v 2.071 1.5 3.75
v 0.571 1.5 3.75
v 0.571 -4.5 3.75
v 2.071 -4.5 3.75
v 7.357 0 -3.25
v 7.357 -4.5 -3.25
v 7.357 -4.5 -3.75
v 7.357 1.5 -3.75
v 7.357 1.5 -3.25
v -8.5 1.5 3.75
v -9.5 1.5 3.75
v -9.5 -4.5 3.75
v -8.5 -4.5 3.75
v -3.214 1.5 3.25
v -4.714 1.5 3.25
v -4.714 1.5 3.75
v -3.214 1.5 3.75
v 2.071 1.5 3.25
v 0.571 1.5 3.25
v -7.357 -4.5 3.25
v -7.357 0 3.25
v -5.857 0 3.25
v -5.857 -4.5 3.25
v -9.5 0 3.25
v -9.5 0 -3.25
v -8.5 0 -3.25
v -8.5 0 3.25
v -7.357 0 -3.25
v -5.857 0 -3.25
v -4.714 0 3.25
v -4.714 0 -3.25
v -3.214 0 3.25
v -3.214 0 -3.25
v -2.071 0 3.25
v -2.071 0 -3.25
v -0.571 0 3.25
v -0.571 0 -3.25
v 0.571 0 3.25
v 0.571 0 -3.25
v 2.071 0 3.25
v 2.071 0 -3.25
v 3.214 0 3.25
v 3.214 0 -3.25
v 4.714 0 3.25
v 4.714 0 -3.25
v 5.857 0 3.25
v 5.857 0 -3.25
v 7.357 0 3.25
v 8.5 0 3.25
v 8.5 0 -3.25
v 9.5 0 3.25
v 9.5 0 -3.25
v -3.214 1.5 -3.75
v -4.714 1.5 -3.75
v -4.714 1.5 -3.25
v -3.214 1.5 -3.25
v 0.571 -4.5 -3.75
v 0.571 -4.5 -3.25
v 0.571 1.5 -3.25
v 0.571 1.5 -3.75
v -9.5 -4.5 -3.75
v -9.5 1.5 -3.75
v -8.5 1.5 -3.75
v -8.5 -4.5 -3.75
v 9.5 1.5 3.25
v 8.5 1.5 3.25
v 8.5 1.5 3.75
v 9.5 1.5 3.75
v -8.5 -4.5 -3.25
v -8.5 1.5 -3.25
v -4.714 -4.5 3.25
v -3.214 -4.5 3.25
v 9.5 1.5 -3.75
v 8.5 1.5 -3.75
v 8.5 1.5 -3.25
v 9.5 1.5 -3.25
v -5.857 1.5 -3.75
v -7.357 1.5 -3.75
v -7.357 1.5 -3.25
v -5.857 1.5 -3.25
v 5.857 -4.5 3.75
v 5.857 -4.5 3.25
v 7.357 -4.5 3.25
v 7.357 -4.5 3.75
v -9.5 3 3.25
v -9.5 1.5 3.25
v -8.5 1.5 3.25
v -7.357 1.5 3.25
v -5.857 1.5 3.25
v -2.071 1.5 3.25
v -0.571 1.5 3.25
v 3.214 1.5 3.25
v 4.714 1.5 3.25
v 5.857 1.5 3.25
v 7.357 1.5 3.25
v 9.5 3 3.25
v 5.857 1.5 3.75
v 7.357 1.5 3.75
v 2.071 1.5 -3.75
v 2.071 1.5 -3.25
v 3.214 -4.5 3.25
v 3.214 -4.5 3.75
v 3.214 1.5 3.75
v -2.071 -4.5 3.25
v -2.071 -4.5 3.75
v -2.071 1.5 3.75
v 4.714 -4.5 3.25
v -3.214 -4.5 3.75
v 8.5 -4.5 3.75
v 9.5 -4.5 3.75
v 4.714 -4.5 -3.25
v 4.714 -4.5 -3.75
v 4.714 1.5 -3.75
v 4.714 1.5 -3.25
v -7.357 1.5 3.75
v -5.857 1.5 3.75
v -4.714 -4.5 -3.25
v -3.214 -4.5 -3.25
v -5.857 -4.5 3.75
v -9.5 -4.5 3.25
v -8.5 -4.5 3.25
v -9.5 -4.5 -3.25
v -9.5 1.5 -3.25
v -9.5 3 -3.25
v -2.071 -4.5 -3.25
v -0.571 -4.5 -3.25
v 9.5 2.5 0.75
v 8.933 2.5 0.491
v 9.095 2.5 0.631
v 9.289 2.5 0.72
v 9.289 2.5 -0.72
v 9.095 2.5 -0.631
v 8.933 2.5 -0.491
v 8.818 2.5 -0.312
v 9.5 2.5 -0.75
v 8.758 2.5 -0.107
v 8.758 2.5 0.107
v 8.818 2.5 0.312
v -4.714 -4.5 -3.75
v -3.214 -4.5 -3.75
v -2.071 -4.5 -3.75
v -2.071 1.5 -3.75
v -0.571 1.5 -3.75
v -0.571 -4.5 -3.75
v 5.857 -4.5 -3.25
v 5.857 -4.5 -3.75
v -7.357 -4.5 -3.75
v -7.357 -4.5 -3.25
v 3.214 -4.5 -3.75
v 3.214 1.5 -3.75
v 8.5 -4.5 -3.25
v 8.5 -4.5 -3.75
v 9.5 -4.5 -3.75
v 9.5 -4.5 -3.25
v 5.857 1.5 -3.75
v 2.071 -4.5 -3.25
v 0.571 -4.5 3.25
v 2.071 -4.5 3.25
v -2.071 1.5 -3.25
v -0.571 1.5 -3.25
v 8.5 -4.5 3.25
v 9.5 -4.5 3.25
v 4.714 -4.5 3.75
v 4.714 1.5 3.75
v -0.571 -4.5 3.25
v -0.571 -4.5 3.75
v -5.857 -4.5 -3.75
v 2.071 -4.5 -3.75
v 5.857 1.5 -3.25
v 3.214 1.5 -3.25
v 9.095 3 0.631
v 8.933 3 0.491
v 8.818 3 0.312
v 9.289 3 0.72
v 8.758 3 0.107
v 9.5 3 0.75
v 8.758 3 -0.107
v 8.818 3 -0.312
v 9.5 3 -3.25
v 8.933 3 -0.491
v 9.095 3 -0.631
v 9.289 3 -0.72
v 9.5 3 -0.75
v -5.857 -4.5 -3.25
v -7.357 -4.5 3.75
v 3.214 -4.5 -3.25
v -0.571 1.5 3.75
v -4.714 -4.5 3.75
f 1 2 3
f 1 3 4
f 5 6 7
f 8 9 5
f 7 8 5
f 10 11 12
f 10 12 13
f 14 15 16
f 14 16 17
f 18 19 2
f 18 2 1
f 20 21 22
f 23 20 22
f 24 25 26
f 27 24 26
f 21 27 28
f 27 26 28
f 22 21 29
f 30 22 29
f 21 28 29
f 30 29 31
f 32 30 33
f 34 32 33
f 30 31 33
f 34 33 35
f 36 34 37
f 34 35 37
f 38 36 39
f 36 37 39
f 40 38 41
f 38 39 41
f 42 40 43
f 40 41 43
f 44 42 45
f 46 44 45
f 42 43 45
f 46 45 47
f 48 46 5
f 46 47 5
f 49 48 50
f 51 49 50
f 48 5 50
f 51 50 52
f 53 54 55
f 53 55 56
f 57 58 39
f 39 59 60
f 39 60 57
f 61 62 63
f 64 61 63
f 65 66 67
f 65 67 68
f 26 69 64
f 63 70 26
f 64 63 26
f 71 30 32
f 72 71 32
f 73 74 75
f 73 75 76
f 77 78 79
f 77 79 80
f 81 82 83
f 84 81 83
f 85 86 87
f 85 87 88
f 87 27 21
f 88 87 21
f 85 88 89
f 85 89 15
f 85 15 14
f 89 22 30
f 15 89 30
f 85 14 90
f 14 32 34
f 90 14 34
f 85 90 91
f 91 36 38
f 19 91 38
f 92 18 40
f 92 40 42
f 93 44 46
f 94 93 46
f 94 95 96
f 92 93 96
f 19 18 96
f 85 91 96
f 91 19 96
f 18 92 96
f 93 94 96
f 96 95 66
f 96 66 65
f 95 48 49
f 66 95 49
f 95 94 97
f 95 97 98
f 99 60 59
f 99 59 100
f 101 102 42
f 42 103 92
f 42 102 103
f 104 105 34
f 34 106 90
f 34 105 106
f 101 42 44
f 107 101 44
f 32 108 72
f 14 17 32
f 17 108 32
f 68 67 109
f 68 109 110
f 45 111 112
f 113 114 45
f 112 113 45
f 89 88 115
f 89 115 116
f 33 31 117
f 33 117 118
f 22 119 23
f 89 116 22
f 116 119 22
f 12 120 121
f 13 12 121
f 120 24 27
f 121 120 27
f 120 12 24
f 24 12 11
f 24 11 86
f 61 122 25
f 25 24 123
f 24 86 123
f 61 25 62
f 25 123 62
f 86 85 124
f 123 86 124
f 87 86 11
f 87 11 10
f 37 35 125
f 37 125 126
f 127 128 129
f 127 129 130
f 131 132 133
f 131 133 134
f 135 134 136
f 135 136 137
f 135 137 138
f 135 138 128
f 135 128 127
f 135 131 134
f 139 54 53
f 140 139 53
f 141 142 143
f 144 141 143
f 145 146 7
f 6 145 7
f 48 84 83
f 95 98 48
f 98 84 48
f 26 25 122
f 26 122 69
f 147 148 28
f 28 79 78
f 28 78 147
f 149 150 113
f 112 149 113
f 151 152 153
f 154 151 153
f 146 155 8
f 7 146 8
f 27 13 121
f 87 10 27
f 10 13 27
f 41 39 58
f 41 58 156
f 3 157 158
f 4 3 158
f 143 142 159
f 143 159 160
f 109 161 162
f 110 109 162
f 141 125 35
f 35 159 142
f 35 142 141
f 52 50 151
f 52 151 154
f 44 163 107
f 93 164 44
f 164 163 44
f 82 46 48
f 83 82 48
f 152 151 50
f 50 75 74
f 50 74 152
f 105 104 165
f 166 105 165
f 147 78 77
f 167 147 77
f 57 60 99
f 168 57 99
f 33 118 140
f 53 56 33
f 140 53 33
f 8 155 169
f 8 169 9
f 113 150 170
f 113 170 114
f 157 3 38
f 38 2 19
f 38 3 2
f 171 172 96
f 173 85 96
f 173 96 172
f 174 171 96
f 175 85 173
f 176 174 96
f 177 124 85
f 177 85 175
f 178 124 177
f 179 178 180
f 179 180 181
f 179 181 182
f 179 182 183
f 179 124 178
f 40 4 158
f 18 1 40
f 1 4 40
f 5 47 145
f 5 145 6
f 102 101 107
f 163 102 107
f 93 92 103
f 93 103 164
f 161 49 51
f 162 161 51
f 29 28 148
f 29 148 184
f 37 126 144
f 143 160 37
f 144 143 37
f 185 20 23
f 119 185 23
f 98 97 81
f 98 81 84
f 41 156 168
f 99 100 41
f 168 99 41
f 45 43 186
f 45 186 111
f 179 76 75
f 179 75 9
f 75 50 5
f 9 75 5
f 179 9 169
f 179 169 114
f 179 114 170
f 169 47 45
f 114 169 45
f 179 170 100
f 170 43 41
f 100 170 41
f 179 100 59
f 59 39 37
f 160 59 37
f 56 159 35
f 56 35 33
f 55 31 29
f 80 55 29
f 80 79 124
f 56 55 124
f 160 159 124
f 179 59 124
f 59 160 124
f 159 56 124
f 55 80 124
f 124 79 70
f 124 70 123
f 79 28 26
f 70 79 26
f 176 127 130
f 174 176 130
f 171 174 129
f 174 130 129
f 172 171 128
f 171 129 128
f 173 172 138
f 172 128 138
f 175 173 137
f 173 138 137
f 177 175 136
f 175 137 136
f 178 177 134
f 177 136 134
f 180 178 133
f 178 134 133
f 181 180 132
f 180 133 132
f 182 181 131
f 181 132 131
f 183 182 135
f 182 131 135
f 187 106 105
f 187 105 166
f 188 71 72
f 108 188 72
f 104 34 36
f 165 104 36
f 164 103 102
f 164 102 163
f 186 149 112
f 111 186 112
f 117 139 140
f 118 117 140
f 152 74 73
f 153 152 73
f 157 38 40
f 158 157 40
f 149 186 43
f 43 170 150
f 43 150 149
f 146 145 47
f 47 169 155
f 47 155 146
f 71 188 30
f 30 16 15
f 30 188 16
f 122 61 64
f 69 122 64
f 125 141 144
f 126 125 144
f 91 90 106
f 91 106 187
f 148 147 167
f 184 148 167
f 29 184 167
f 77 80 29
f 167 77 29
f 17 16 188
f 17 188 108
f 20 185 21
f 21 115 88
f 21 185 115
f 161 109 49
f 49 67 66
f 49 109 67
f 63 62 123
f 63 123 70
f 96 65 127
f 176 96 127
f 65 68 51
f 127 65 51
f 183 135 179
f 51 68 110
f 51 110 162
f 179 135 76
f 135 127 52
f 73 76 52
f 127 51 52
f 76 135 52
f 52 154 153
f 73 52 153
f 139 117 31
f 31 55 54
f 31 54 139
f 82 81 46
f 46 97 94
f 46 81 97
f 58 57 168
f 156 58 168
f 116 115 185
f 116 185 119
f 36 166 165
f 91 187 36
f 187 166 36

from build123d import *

# Parameters (mm, degrees)
EXTRUDE_1_DEPTH = 3
EXTRUDE_2_DEPTH = 2.5
EXTRUDE_START   = 1.5
SKETCH_1_4_W    = 1
SKETCH_1_4_H    = 0.5
SKETCH_1_4_W_2  = 1.5
EXTRUDE_3_DEPTH = 6


with BuildPart() as part:
    # Эскиз1 → Бобышка-Вытянуть1 (new body)
    with BuildSketch(Plane(origin=(0, 0, 0), x_dir=(1, 0, 0), z_dir=(0, 1, 0))):
        with BuildLine():
            Line((-8.5, 3.25), (-9.5, 3.25))
            Line((-9.5, 3.25), (-9.5, -3.25))
            Line((-9.5, -3.25), (-8.5, -3.25))
            Line((-8.5, -3.25), (-7.357142857, -3.25))
            Line((-7.357142857, -3.25), (-5.857142857, -3.25))
            Line((-5.857142857, -3.25), (-4.714285714, -3.25))
            Line((-4.714285714, -3.25), (-3.214285714, -3.25))
            Line((-3.214285714, -3.25), (-2.071428571, -3.25))
            Line((-2.071428571, -3.25), (-0.571428571, -3.25))
            Line((-0.571428571, -3.25), (0.571428571, -3.25))
            Line((0.571428571, -3.25), (2.071428571, -3.25))
            Line((2.071428571, -3.25), (3.214285714, -3.25))
            Line((3.214285714, -3.25), (4.714285714, -3.25))
            Line((4.714285714, -3.25), (5.857142857, -3.25))
            Line((5.857142857, -3.25), (7.357142857, -3.25))
            Line((7.357142857, -3.25), (8.5, -3.25))
            Line((8.5, -3.25), (9.5, -3.25))
            Line((9.5, -3.25), (9.5, -0.75))
            ThreePointArc((9.5, -0.75), (8.75, 0), (9.5, 0.75))
            Line((9.5, 0.75), (9.5, 3.25))
            Line((9.5, 3.25), (8.5, 3.25))
            Line((8.5, 3.25), (7.357142857, 3.25))
            Line((7.357142857, 3.25), (5.857142857, 3.25))
            Line((5.857142857, 3.25), (4.714285714, 3.25))
            Line((4.714285714, 3.25), (3.214285714, 3.25))
            Line((3.214285714, 3.25), (2.071428571, 3.25))
            Line((2.071428571, 3.25), (0.571428571, 3.25))
            Line((0.571428571, 3.25), (-0.571428571, 3.25))
            Line((-0.571428571, 3.25), (-2.071428571, 3.25))
            Line((-2.071428571, 3.25), (-3.214285714, 3.25))
            Line((-3.214285714, 3.25), (-4.714285714, 3.25))
            Line((-4.714285714, 3.25), (-5.857142857, 3.25))
            Line((-5.857142857, 3.25), (-7.357142857, 3.25))
            Line((-7.357142857, 3.25), (-8.5, 3.25))
        make_face()
    extrude(amount=EXTRUDE_1_DEPTH)

    # Эскиз1<3> → Бобышка-Вытянуть2 (add)
    with BuildSketch(Plane(origin=(0, 0, 0), x_dir=(1, 0, 0), z_dir=(0, 1, 0))):
        with BuildLine():
            Line((9.5, -0.75), (9.5, 0.75))
            ThreePointArc((9.5, 0.75), (8.75, 0), (9.5, -0.75))
        make_face()
    extrude(amount=EXTRUDE_2_DEPTH)

    # Эскиз1<4> → Бобышка-Вытянуть3 (add)
    with BuildSketch(Plane(origin=(0, 0, 0), x_dir=(1, 0, 0), z_dir=(0, 1, 0)).offset(EXTRUDE_START)):
        with Locations((-9, 3.5)):
            Rectangle(SKETCH_1_4_W, SKETCH_1_4_H)
        with Locations((-9, -3.5)):
            Rectangle(SKETCH_1_4_W, SKETCH_1_4_H)
        with Locations((-6.607142857, 3.5)):
            Rectangle(SKETCH_1_4_W_2, SKETCH_1_4_H)
        with Locations((-6.607142857, -3.5)):
            Rectangle(SKETCH_1_4_W_2, SKETCH_1_4_H)
        with Locations((-3.964285714, 3.5)):
            Rectangle(SKETCH_1_4_W_2, SKETCH_1_4_H)
        with Locations((-3.964285714, -3.5)):
            Rectangle(SKETCH_1_4_W_2, SKETCH_1_4_H)
        with Locations((-1.321428571, 3.5)):
            Rectangle(SKETCH_1_4_W_2, SKETCH_1_4_H)
        with Locations((-1.321428571, -3.5)):
            Rectangle(SKETCH_1_4_W_2, SKETCH_1_4_H)
        with Locations((1.321428571, 3.5)):
            Rectangle(SKETCH_1_4_W_2, SKETCH_1_4_H)
        with Locations((1.321428571, -3.5)):
            Rectangle(SKETCH_1_4_W_2, SKETCH_1_4_H)
        with Locations((3.964285714, 3.5)):
            Rectangle(SKETCH_1_4_W_2, SKETCH_1_4_H)
        with Locations((3.964285714, -3.5)):
            Rectangle(SKETCH_1_4_W_2, SKETCH_1_4_H)
        with Locations((6.607142857, 3.5)):
            Rectangle(SKETCH_1_4_W_2, SKETCH_1_4_H)
        with Locations((6.607142857, -3.5)):
            Rectangle(SKETCH_1_4_W_2, SKETCH_1_4_H)
        with Locations((9, 3.5)):
            Rectangle(SKETCH_1_4_W, SKETCH_1_4_H)
        with Locations((9, -3.5)):
            Rectangle(SKETCH_1_4_W, SKETCH_1_4_H)
    extrude(amount=-EXTRUDE_3_DEPTH)


solid = part.part
